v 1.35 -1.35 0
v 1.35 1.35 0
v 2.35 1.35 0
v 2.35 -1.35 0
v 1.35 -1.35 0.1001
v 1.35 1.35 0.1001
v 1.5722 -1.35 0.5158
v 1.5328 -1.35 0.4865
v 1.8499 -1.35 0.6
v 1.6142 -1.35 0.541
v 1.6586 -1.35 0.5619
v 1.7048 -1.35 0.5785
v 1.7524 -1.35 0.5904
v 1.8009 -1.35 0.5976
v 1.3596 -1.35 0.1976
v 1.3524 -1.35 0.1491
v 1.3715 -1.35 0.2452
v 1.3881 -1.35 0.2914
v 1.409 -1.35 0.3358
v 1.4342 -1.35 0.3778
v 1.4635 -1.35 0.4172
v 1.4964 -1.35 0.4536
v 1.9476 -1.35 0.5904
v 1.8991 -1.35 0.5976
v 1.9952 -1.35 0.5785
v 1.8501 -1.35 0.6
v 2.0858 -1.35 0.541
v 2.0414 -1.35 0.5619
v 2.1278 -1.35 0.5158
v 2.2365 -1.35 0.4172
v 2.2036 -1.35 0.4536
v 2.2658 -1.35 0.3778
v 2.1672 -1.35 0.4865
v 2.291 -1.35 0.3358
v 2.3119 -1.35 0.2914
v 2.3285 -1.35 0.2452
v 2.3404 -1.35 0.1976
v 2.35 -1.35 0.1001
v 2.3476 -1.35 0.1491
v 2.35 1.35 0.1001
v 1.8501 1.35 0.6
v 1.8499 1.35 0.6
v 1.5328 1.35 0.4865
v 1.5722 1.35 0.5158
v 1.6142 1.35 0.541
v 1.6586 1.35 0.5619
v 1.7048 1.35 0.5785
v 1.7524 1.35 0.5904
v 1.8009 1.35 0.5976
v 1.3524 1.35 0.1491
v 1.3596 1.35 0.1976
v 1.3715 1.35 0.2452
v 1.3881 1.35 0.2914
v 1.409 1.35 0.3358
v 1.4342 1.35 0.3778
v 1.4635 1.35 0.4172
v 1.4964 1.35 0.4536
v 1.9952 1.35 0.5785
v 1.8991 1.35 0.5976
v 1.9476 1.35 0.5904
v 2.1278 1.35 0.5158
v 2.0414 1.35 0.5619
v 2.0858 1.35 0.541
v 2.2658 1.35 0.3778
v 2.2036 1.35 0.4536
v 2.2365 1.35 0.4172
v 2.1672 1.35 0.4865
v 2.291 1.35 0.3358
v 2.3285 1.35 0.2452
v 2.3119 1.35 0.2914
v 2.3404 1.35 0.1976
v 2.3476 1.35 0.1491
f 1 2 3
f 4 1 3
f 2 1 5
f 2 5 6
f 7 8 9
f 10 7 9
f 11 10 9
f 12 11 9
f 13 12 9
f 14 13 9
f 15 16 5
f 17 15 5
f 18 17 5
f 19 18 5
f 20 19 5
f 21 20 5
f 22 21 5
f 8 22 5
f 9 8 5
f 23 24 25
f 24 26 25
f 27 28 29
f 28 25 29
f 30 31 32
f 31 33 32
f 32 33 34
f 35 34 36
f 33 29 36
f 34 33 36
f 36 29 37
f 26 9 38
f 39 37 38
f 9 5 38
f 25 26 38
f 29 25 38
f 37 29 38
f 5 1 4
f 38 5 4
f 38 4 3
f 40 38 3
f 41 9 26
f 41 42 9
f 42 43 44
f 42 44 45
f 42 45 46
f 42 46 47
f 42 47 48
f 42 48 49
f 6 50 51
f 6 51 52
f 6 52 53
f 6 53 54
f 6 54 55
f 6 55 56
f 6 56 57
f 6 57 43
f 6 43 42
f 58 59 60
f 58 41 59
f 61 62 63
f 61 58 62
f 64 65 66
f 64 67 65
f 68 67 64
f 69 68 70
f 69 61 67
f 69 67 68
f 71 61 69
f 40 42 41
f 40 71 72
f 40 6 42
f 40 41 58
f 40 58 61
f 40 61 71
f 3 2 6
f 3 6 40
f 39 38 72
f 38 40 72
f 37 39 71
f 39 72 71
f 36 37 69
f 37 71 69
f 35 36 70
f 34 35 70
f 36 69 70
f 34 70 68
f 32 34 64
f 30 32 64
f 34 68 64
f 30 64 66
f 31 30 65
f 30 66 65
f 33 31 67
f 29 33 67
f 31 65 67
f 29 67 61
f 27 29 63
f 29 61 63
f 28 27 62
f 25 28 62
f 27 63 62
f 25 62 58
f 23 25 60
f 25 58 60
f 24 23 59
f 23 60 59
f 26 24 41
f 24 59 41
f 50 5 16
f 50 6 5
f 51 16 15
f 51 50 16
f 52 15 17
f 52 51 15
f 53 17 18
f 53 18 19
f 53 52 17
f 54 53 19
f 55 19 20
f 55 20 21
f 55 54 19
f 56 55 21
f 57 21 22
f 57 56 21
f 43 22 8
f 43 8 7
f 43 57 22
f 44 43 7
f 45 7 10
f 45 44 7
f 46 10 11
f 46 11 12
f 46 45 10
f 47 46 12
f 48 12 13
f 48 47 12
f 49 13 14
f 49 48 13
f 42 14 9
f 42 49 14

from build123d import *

# Parameters (mm, degrees)
CROQUIS1_W              = 1
CROQUIS1_H              = 2.7
SALIENTE_EXTRUIR1_DEPTH = 0.6
REDONDEO1_R             = 0.5


with BuildPart() as part:
    # Croquis1 → Saliente-Extruir1 (new body)
    with BuildSketch(Plane.XY):
        with Locations((1.85, 0)):
            Rectangle(CROQUIS1_W, CROQUIS1_H)
    extrude(amount=SALIENTE_EXTRUIR1_DEPTH)

    # Redondeo1
    redondeo1_edges = [part.edges().sort_by_distance(p)[0] for p in [
        (2.35, 0, 0.6),
        (1.35, 0, 0.6),
    ]]
    fillet(redondeo1_edges, radius=REDONDEO1_R - 0.0001)  # a hair under: the kernel refuses the full size


solid = part.part
